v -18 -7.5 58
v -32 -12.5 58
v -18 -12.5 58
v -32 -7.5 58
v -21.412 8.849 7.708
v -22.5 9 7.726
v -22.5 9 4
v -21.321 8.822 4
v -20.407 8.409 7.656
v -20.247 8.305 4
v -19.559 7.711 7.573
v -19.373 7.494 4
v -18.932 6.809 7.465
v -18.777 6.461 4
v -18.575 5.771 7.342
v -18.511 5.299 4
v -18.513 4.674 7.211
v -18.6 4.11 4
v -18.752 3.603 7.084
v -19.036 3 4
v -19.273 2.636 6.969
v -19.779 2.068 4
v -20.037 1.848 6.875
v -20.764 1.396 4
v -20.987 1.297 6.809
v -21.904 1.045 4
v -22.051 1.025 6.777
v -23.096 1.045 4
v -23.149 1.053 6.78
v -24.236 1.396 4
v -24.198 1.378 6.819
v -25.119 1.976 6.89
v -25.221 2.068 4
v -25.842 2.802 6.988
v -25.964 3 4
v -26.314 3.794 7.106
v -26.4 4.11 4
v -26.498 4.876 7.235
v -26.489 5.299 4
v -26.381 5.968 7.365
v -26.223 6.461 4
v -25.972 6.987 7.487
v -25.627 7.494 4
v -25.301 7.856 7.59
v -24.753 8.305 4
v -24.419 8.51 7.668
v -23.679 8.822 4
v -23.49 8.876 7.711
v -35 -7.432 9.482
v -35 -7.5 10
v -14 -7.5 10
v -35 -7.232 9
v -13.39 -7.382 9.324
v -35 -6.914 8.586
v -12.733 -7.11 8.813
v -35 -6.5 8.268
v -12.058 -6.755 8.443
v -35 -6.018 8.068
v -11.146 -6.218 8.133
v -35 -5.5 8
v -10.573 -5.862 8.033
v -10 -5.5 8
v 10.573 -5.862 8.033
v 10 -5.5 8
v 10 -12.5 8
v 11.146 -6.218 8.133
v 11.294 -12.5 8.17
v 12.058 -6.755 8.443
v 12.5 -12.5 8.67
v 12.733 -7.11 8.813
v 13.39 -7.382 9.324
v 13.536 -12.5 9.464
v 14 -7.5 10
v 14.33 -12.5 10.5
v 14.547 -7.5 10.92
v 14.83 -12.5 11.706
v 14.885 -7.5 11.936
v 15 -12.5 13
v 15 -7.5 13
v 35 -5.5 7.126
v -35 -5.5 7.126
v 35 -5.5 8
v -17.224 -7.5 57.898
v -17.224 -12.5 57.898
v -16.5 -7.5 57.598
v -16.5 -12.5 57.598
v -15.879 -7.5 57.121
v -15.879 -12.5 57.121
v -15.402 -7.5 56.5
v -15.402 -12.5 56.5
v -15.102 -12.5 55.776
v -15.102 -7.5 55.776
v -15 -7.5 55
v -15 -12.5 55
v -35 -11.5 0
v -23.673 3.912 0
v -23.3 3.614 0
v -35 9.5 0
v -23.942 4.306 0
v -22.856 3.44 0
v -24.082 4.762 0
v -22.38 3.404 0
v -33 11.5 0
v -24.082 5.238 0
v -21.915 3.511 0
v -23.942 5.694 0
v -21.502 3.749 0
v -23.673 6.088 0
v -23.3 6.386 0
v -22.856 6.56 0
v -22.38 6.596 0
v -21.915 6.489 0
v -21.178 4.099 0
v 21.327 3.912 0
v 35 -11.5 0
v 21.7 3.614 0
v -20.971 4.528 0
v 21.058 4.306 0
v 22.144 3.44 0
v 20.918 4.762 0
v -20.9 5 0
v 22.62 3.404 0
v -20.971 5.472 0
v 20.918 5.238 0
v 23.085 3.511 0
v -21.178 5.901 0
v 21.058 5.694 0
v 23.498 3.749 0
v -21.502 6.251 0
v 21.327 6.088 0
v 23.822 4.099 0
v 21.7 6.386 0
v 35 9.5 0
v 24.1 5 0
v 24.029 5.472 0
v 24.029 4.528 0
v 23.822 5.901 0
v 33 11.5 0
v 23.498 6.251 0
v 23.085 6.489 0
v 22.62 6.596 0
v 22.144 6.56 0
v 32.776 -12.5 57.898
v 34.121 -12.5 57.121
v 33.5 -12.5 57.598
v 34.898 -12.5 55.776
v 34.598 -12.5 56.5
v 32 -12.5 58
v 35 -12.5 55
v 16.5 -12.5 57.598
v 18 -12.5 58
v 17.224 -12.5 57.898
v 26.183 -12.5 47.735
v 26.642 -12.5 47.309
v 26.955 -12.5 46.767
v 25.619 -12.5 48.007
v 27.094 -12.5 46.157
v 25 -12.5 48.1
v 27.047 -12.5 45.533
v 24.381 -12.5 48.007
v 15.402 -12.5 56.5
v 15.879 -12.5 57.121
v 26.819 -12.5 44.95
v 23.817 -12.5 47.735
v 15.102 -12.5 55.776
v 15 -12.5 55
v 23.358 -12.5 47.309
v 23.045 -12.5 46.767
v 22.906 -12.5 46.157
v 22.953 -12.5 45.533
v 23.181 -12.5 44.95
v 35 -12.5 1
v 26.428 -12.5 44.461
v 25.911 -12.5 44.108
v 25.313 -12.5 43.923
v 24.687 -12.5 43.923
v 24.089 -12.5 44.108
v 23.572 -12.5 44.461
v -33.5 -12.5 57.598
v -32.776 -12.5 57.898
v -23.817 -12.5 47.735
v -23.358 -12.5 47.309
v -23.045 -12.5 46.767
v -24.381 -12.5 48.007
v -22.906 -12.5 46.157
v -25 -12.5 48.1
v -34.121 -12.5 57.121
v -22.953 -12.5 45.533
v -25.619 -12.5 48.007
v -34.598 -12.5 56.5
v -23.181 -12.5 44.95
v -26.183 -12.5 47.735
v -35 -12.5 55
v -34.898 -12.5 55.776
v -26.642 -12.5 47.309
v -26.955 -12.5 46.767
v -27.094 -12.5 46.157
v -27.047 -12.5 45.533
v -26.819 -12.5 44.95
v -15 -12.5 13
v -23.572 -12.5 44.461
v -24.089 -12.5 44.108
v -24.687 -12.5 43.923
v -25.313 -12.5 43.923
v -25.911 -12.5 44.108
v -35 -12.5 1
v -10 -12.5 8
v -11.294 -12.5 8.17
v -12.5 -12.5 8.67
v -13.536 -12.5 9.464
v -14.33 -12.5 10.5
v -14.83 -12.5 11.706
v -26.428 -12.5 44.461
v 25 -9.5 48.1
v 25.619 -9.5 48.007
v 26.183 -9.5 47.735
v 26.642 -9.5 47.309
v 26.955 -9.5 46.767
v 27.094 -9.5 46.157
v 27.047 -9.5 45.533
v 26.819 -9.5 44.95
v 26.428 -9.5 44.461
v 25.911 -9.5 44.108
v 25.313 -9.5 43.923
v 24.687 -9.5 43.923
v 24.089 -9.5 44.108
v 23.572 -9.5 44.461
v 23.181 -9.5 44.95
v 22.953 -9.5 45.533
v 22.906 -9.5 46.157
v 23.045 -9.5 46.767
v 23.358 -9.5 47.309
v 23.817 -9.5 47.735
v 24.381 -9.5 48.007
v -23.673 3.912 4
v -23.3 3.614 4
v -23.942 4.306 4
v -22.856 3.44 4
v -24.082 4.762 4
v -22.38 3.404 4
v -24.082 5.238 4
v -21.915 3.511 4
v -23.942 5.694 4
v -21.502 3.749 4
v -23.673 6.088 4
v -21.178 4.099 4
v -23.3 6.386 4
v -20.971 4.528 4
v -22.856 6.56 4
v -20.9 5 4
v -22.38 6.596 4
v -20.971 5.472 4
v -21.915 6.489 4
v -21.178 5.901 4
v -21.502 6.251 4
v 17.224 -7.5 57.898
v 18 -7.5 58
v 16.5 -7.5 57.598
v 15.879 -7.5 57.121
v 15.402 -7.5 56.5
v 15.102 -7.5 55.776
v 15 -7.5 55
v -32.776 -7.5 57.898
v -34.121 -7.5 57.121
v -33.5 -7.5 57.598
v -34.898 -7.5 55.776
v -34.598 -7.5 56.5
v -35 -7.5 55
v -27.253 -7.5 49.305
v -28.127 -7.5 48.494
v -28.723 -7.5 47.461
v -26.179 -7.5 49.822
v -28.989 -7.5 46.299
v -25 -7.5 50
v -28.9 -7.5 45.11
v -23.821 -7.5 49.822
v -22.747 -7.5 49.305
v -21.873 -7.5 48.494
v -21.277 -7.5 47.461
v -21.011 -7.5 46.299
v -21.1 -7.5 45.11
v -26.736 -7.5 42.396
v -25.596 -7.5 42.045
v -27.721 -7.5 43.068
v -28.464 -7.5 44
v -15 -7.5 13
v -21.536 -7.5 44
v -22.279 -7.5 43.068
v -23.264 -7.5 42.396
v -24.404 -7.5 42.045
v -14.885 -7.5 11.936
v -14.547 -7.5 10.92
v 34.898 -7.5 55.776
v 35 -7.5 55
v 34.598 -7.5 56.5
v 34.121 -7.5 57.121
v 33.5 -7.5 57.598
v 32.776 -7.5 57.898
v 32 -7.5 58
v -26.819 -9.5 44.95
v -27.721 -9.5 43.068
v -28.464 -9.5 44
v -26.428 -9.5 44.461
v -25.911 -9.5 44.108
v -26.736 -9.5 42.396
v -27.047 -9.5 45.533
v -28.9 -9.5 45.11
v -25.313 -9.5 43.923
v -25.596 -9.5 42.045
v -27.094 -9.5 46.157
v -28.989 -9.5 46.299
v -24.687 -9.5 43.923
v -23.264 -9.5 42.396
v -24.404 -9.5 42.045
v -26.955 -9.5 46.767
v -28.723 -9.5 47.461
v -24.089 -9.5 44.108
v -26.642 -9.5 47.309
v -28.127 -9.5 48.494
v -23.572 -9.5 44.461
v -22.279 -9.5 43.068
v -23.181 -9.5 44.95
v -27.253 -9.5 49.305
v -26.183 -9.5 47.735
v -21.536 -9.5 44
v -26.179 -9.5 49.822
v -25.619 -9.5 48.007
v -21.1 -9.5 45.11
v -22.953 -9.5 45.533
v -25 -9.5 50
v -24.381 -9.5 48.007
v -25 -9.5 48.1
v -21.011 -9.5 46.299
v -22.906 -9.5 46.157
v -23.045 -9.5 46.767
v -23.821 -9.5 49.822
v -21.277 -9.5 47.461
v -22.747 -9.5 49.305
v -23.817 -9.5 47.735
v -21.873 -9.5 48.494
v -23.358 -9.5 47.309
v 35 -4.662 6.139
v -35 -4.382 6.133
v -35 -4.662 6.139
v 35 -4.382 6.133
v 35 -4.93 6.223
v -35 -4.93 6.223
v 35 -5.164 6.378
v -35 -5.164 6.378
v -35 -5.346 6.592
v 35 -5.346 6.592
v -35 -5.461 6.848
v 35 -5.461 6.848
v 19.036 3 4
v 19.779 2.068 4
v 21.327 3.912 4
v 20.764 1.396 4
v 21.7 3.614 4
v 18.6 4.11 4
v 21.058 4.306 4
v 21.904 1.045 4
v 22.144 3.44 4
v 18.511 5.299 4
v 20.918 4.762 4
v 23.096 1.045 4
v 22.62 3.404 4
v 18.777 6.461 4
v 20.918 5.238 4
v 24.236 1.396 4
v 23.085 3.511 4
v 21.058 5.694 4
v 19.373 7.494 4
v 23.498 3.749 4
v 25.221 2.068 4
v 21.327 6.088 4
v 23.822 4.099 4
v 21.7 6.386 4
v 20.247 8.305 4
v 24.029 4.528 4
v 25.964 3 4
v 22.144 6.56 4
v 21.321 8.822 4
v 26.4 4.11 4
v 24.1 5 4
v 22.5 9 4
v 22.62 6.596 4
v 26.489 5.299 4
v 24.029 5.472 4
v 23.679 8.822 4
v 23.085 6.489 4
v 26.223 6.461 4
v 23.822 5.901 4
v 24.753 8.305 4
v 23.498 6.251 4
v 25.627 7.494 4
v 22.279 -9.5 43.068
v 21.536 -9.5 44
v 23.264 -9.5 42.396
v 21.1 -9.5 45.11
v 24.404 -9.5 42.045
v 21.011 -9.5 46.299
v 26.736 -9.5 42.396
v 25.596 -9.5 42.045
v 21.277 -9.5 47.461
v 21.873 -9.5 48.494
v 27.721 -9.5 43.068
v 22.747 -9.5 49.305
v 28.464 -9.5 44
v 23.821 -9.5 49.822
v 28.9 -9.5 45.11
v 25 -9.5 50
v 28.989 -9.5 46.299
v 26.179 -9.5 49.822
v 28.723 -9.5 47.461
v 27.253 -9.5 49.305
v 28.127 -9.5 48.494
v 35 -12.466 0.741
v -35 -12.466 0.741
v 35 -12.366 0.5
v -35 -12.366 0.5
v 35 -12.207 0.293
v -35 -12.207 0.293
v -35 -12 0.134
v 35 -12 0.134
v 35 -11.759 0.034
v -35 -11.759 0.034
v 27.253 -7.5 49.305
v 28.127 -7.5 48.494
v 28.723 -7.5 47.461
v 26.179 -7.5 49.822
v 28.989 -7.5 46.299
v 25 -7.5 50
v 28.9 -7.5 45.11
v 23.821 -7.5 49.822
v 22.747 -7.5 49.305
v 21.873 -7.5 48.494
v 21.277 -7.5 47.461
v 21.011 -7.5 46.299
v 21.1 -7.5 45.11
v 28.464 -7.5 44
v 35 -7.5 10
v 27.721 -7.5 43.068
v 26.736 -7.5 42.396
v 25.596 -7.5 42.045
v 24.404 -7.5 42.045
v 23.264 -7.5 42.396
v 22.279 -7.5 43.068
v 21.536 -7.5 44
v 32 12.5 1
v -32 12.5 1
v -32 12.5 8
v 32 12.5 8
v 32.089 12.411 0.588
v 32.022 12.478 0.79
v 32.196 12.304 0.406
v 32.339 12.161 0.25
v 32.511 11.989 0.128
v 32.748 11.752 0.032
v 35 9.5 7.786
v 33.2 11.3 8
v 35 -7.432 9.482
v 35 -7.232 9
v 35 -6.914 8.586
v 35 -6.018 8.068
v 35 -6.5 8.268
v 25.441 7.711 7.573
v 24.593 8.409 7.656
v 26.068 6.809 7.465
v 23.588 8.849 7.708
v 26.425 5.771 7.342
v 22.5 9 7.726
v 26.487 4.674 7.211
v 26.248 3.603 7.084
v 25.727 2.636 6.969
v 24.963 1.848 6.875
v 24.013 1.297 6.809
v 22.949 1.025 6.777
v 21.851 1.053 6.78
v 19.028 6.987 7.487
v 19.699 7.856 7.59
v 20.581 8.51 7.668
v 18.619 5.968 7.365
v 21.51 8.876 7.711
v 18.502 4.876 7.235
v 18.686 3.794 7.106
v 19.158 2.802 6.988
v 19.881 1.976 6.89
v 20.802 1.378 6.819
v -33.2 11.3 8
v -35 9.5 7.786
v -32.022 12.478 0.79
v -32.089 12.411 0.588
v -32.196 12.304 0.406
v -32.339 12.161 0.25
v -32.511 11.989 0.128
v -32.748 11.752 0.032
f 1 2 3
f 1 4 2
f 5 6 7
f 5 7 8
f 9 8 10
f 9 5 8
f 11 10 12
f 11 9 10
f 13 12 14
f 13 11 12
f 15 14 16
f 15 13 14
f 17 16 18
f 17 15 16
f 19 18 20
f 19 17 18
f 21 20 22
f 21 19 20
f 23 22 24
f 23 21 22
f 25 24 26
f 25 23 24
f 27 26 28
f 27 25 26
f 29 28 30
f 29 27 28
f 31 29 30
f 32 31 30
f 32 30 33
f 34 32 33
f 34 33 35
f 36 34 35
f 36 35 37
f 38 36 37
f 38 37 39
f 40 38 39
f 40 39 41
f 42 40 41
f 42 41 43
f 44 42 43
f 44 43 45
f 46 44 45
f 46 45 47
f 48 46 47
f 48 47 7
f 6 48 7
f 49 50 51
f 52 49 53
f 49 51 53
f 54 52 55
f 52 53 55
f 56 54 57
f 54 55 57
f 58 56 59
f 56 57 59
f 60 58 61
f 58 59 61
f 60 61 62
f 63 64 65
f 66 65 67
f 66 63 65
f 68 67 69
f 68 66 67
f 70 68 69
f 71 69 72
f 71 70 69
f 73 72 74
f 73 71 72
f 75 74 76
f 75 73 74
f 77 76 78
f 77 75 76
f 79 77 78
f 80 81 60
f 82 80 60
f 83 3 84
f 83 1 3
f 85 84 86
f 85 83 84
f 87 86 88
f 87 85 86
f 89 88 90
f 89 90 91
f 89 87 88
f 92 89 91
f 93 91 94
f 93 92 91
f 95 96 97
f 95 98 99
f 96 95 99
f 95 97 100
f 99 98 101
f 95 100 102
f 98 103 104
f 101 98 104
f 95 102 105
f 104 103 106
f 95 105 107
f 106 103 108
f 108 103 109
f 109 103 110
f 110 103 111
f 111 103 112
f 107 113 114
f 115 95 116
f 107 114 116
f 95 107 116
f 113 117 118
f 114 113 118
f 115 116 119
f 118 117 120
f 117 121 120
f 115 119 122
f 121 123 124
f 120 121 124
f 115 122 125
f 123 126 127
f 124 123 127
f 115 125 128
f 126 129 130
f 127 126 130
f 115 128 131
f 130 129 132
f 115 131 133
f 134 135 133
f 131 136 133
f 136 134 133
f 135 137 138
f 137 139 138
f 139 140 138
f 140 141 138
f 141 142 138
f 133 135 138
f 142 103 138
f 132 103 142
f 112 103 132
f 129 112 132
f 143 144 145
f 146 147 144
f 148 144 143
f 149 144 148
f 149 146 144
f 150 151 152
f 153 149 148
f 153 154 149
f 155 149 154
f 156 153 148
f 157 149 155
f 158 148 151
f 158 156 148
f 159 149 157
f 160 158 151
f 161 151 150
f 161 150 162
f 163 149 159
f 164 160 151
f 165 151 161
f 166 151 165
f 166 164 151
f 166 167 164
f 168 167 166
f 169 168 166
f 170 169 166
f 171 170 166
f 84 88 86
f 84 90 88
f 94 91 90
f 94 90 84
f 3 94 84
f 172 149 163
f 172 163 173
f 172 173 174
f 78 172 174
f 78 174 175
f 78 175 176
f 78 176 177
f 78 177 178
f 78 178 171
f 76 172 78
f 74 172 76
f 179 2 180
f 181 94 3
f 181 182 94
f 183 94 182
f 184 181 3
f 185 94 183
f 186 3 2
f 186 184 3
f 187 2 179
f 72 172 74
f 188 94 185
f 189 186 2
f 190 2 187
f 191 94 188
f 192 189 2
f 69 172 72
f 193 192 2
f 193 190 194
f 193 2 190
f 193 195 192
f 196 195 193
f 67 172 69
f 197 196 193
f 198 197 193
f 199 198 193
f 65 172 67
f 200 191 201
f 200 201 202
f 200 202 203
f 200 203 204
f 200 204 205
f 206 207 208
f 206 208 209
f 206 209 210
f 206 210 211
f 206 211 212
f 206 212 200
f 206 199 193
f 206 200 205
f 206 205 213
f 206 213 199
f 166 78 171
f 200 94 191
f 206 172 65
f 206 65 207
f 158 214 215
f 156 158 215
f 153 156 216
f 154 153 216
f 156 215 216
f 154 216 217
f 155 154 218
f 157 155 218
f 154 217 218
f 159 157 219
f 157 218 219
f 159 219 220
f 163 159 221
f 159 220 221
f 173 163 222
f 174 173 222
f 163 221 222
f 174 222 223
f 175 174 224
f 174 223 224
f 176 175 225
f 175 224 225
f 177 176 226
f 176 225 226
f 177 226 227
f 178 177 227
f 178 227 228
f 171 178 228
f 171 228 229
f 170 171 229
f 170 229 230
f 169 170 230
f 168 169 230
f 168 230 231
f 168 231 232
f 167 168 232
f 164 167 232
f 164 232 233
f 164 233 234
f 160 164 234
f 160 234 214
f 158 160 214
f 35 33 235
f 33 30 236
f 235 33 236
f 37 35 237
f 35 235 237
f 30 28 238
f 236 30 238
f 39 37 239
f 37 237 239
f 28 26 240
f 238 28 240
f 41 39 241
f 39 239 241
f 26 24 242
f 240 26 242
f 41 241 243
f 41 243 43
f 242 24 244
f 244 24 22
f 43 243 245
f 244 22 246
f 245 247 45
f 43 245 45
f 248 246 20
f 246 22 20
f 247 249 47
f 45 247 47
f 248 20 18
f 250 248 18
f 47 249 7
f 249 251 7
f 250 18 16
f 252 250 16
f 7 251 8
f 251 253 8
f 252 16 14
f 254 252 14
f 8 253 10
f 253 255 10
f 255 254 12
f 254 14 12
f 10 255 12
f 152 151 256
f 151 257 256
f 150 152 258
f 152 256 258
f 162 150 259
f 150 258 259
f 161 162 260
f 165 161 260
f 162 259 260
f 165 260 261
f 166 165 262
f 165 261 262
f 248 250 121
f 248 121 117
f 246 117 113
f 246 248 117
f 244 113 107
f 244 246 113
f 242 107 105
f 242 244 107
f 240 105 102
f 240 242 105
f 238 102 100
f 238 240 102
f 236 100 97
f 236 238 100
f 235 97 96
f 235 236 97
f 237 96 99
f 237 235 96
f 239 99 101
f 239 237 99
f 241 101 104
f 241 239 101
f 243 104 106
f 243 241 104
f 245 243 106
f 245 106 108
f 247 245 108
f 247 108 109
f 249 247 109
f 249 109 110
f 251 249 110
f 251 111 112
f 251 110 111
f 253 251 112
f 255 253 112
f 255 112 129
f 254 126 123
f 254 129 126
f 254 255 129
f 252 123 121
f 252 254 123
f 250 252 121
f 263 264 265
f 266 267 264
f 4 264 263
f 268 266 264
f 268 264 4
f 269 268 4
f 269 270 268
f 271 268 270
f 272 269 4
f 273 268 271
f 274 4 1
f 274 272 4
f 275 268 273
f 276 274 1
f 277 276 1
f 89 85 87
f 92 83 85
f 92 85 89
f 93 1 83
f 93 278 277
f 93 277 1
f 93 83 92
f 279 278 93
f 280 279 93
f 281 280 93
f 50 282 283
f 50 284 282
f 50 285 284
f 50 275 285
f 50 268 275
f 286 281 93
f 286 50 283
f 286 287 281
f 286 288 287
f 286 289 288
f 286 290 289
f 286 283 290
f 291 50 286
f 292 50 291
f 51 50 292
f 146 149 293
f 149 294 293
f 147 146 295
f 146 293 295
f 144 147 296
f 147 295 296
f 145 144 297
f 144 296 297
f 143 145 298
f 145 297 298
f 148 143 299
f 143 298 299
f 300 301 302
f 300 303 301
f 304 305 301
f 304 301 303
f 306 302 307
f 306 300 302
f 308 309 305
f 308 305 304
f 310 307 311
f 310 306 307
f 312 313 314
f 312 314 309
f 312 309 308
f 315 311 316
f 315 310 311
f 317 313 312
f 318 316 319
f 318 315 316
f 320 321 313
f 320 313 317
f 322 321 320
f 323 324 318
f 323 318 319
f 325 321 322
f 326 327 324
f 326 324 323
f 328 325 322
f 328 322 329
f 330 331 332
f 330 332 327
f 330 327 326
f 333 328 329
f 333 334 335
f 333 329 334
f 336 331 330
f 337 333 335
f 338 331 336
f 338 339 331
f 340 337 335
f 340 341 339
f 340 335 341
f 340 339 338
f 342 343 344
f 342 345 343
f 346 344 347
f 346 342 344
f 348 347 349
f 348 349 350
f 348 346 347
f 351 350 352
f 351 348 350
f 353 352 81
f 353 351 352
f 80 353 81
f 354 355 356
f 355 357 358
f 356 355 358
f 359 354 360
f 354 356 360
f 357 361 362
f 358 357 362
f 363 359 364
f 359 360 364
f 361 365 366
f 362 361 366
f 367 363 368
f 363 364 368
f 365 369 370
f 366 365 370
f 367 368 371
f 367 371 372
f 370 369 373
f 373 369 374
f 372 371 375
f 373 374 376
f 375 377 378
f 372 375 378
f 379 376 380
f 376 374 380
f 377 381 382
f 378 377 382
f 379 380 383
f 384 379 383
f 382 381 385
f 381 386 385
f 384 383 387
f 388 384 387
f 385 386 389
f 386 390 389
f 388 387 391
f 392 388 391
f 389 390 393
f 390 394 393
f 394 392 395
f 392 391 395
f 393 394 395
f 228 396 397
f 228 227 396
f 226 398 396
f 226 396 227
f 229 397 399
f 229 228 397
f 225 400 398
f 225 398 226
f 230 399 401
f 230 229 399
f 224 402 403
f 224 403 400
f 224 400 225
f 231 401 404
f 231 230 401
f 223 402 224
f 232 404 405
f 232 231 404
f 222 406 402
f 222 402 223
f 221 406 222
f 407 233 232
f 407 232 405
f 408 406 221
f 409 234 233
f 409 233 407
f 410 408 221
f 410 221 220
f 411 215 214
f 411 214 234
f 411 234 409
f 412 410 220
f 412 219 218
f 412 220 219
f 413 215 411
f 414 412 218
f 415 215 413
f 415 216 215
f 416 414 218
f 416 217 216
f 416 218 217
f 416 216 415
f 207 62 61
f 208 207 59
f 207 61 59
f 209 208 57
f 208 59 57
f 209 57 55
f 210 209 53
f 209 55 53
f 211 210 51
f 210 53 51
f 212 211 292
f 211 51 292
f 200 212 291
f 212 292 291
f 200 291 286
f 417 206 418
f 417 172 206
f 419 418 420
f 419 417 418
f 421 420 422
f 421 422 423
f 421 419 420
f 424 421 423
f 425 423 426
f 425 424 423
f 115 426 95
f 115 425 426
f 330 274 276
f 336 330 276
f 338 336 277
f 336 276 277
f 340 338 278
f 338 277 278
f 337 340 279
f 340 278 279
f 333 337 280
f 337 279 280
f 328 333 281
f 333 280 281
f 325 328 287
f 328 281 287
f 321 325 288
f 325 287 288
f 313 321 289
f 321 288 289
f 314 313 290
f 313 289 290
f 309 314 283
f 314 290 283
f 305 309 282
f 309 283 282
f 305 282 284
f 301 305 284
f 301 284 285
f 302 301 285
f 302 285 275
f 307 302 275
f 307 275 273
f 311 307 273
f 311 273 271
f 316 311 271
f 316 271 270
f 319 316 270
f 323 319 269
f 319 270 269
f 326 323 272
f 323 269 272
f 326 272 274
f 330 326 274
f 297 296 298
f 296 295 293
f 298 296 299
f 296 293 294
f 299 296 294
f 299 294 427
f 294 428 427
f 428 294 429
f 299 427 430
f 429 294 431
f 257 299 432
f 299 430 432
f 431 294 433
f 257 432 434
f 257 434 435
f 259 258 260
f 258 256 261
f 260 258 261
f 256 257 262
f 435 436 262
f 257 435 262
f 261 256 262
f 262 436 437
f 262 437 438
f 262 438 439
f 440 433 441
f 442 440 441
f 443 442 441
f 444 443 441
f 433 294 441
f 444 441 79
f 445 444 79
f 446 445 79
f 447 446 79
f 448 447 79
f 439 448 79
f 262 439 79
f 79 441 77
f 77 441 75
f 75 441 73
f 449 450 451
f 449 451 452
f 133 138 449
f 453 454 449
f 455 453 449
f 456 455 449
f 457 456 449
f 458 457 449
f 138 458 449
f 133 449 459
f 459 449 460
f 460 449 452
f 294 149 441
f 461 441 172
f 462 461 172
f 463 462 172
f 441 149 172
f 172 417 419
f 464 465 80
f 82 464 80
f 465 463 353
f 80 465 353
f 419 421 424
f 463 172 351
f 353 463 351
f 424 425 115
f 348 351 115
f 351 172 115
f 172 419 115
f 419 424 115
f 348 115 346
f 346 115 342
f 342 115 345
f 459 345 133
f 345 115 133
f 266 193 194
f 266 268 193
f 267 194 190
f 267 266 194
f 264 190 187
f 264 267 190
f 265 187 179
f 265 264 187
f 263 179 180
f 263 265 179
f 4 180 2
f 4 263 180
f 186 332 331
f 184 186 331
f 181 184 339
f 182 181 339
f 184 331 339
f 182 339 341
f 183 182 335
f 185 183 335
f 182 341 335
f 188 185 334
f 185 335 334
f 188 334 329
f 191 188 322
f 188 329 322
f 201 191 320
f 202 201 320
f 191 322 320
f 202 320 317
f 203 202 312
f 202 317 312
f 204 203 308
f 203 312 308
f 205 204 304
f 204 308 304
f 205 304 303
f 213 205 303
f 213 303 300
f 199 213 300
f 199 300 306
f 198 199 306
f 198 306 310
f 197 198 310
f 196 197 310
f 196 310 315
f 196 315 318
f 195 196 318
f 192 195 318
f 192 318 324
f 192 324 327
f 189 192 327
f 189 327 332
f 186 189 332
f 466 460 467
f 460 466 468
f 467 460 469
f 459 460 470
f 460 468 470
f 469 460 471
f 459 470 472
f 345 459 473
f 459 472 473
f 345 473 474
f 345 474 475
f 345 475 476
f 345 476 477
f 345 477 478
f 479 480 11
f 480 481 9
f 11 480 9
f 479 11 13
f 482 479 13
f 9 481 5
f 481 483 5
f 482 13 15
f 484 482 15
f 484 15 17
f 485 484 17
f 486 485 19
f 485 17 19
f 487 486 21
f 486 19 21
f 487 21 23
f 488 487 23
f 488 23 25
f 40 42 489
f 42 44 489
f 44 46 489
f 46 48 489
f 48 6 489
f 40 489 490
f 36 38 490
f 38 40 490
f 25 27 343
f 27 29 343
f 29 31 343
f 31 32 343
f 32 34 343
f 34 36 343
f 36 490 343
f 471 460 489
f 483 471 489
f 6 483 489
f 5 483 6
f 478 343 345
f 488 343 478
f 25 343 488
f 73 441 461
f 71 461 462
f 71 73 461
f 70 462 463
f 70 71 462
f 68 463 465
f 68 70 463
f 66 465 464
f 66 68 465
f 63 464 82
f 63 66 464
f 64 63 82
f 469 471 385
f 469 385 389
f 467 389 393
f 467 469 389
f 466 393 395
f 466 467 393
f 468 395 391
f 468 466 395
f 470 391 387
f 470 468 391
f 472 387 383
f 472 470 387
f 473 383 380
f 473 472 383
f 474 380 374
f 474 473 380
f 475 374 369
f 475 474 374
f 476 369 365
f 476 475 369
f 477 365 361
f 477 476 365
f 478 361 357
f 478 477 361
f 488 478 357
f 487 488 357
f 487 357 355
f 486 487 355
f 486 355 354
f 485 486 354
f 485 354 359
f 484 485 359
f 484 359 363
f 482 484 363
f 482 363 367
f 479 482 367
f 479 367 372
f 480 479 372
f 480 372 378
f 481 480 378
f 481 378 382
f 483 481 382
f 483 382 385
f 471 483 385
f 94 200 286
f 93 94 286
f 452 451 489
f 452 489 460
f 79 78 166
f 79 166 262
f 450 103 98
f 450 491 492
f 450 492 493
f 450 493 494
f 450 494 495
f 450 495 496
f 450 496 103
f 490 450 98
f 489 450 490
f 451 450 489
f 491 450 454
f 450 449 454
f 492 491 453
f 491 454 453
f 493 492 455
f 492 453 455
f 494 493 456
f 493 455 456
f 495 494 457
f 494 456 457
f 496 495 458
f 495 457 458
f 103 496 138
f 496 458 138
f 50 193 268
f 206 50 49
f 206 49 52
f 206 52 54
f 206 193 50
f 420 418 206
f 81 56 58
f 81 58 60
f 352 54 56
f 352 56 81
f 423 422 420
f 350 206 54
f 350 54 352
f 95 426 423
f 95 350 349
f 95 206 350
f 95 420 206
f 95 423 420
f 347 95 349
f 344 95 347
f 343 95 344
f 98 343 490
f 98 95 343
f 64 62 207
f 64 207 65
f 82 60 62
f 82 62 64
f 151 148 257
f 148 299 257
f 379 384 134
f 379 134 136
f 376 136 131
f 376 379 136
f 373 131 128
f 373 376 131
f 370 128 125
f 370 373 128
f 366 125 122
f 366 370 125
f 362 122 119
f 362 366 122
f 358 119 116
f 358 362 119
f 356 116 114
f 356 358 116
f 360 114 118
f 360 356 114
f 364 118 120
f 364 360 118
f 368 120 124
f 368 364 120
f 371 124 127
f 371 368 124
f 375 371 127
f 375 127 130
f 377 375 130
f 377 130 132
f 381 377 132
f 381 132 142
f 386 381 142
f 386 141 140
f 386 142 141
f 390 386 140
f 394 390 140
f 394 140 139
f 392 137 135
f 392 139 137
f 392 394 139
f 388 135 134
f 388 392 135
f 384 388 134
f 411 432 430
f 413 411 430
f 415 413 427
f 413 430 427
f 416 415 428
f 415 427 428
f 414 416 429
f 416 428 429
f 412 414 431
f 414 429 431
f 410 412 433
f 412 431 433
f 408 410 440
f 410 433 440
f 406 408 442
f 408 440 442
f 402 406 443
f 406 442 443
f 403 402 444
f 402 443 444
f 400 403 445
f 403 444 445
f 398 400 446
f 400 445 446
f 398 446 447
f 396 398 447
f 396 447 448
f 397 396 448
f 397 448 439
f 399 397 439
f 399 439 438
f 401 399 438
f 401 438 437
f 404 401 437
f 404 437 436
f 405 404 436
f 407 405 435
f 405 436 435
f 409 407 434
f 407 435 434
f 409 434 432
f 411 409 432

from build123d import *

# Parameters (mm, degrees)
SKETCH1_W           = 70
SKETCH1_H           = 25
BOSS_EXTRUDE1_DEPTH = 8
SKETCH4_W           = 20
SKETCH4_H           = 5
BOSS_EXTRUDE2_DEPTH = 50
CHAMFER1_SIZE       = 3
CUT_EXTRUDE5_DEPTH  = 92.761920207
FILLET13_R          = 5
FILLET14_R          = 2
FILLET15_R          = 1
SKETCH11_R          = 2.1
CUT_EXTRUDE6_DEPTH  = 10
FILLET18_R          = 3
FILLET20_R          = 1
SKETCH16_R          = 1.6
CUT_EXTRUDE11_DEPTH = 10
SKETCH17_R          = 4
CUT_EXTRUDE12_DEPTH = 4
SKETCH18_R          = 4
CUT_EXTRUDE13_DEPTH = 2


with BuildPart() as part:
    # Sketch1 → Boss-Extrude1 (new body)
    with BuildSketch(Plane.XY):
        Rectangle(SKETCH1_W, SKETCH1_H)
    extrude(amount=BOSS_EXTRUDE1_DEPTH)

    # Sketch4 → Boss-Extrude2 (add)
    with BuildSketch(Plane.XY.offset(8)):
        with Locations((-25, -10)):
            Rectangle(SKETCH4_W, SKETCH4_H)
    boss_extrude2 = extrude(amount=BOSS_EXTRUDE2_DEPTH)

    # Mirror1: Boss-Extrude2 across plane
    add(boss_extrude2.mirror(Plane.ZY))

    # Chamfer1
    chamfer1_edges = [part.edges().sort_by_distance(p)[0] for p in [
        (-35, 12.5, 4),
        (35, 12.5, 4),
    ]]
    chamfer(chamfer1_edges, length=CHAMFER1_SIZE)

    # Sketch10 → Cut-Extrude5 (cut, through all)
    with BuildSketch(Plane.ZY.offset(35)):
        Polygon((8, 11.3), (6, -5.5), (8, -5.5), align=None)
    extrude(amount=-CUT_EXTRUDE5_DEPTH, mode=Mode.SUBTRACT)

    # Fillet13
    fillet13_edges = [part.edges().sort_by_distance(p)[0] for p in [
        (-15, -10, 8),
        (15, -10, 8),
    ]]
    fillet(fillet13_edges, radius=FILLET13_R)

    # Fillet14
    fillet14_edges = [part.edges().sort_by_distance(p)[0] for p in [
        (22.5, -7.5, 8),
        (-22.5, -7.5, 8),
    ]]
    fillet(fillet14_edges, radius=FILLET14_R - 0.0001)  # a hair under: the kernel refuses the full size

    # Fillet15
    fillet15_edges = [part.edges().sort_by_distance(p)[0] for p in [
        (0, 12.5, 0),
        (0, -12.5, 0),
    ]]
    fillet(fillet15_edges, radius=FILLET15_R)

    # Sketch11 → Cut-Extrude6 (cut)
    with BuildSketch(Plane(origin=(0, -7.5, 0), x_dir=(1, 0, 0), z_dir=(0, 1, 0))):
        with Locations(Location((-25, -46, 0), (0, 0, 270))):
            Circle(SKETCH11_R)
        with Locations(Location((25, -46, 0), (0, 0, 270))):
            Circle(SKETCH11_R)
    extrude(amount=-CUT_EXTRUDE6_DEPTH, mode=Mode.SUBTRACT)

    # Fillet18
    fillet18_edges = [part.edges().sort_by_distance(p)[0] for p in [
        (-35, -10, 58),
        (-15, -10, 58),
        (35, -10, 58),
        (15, -10, 58),
    ]]
    fillet(fillet18_edges, radius=FILLET18_R)

    # Fillet20
    fillet20_edges = [part.edges().sort_by_distance(p)[0] for p in [
        (0, -5.5, 6),
    ]]
    fillet(fillet20_edges, radius=FILLET20_R)

    # Sketch16 → Cut-Extrude11 (cut)
    with BuildSketch(Plane(origin=(0, 0, 8), x_dir=(-1, 0, 0), z_dir=(0, 0, -1))):
        with Locations(Location((-22.5, 5, 0), (0, 0, 180))):
            Circle(SKETCH16_R)
        with Locations(Location((22.5, 5, 0), (0, 0, 180))):
            Circle(SKETCH16_R)
    extrude(amount=CUT_EXTRUDE11_DEPTH, mode=Mode.SUBTRACT)

    # Sketch17 → Cut-Extrude12 (cut)
    with BuildSketch(Plane(origin=(0, 0, 8), x_dir=(-1, 0, 0), z_dir=(0, 0, -1))):
        with Locations(Location((-22.5, 5, 0), (0, 0, 90))):
            Circle(SKETCH17_R)
        with Locations(Location((22.5, 5, 0), (0, 0, 90))):
            Circle(SKETCH17_R)
    extrude(amount=CUT_EXTRUDE12_DEPTH, mode=Mode.SUBTRACT)

    # Sketch18 → Cut-Extrude13 (cut)
    with BuildSketch(Plane(origin=(0, -7.5, 0), x_dir=(1, 0, 0), z_dir=(0, 1, 0))):
        with Locations(Location((-25, -46, 0), (0, 0, 270))):
            Circle(SKETCH18_R)
        with Locations(Location((25, -46, 0), (0, 0, 270))):
            Circle(SKETCH18_R)
    extrude(amount=-CUT_EXTRUDE13_DEPTH, mode=Mode.SUBTRACT)


solid = part.part
